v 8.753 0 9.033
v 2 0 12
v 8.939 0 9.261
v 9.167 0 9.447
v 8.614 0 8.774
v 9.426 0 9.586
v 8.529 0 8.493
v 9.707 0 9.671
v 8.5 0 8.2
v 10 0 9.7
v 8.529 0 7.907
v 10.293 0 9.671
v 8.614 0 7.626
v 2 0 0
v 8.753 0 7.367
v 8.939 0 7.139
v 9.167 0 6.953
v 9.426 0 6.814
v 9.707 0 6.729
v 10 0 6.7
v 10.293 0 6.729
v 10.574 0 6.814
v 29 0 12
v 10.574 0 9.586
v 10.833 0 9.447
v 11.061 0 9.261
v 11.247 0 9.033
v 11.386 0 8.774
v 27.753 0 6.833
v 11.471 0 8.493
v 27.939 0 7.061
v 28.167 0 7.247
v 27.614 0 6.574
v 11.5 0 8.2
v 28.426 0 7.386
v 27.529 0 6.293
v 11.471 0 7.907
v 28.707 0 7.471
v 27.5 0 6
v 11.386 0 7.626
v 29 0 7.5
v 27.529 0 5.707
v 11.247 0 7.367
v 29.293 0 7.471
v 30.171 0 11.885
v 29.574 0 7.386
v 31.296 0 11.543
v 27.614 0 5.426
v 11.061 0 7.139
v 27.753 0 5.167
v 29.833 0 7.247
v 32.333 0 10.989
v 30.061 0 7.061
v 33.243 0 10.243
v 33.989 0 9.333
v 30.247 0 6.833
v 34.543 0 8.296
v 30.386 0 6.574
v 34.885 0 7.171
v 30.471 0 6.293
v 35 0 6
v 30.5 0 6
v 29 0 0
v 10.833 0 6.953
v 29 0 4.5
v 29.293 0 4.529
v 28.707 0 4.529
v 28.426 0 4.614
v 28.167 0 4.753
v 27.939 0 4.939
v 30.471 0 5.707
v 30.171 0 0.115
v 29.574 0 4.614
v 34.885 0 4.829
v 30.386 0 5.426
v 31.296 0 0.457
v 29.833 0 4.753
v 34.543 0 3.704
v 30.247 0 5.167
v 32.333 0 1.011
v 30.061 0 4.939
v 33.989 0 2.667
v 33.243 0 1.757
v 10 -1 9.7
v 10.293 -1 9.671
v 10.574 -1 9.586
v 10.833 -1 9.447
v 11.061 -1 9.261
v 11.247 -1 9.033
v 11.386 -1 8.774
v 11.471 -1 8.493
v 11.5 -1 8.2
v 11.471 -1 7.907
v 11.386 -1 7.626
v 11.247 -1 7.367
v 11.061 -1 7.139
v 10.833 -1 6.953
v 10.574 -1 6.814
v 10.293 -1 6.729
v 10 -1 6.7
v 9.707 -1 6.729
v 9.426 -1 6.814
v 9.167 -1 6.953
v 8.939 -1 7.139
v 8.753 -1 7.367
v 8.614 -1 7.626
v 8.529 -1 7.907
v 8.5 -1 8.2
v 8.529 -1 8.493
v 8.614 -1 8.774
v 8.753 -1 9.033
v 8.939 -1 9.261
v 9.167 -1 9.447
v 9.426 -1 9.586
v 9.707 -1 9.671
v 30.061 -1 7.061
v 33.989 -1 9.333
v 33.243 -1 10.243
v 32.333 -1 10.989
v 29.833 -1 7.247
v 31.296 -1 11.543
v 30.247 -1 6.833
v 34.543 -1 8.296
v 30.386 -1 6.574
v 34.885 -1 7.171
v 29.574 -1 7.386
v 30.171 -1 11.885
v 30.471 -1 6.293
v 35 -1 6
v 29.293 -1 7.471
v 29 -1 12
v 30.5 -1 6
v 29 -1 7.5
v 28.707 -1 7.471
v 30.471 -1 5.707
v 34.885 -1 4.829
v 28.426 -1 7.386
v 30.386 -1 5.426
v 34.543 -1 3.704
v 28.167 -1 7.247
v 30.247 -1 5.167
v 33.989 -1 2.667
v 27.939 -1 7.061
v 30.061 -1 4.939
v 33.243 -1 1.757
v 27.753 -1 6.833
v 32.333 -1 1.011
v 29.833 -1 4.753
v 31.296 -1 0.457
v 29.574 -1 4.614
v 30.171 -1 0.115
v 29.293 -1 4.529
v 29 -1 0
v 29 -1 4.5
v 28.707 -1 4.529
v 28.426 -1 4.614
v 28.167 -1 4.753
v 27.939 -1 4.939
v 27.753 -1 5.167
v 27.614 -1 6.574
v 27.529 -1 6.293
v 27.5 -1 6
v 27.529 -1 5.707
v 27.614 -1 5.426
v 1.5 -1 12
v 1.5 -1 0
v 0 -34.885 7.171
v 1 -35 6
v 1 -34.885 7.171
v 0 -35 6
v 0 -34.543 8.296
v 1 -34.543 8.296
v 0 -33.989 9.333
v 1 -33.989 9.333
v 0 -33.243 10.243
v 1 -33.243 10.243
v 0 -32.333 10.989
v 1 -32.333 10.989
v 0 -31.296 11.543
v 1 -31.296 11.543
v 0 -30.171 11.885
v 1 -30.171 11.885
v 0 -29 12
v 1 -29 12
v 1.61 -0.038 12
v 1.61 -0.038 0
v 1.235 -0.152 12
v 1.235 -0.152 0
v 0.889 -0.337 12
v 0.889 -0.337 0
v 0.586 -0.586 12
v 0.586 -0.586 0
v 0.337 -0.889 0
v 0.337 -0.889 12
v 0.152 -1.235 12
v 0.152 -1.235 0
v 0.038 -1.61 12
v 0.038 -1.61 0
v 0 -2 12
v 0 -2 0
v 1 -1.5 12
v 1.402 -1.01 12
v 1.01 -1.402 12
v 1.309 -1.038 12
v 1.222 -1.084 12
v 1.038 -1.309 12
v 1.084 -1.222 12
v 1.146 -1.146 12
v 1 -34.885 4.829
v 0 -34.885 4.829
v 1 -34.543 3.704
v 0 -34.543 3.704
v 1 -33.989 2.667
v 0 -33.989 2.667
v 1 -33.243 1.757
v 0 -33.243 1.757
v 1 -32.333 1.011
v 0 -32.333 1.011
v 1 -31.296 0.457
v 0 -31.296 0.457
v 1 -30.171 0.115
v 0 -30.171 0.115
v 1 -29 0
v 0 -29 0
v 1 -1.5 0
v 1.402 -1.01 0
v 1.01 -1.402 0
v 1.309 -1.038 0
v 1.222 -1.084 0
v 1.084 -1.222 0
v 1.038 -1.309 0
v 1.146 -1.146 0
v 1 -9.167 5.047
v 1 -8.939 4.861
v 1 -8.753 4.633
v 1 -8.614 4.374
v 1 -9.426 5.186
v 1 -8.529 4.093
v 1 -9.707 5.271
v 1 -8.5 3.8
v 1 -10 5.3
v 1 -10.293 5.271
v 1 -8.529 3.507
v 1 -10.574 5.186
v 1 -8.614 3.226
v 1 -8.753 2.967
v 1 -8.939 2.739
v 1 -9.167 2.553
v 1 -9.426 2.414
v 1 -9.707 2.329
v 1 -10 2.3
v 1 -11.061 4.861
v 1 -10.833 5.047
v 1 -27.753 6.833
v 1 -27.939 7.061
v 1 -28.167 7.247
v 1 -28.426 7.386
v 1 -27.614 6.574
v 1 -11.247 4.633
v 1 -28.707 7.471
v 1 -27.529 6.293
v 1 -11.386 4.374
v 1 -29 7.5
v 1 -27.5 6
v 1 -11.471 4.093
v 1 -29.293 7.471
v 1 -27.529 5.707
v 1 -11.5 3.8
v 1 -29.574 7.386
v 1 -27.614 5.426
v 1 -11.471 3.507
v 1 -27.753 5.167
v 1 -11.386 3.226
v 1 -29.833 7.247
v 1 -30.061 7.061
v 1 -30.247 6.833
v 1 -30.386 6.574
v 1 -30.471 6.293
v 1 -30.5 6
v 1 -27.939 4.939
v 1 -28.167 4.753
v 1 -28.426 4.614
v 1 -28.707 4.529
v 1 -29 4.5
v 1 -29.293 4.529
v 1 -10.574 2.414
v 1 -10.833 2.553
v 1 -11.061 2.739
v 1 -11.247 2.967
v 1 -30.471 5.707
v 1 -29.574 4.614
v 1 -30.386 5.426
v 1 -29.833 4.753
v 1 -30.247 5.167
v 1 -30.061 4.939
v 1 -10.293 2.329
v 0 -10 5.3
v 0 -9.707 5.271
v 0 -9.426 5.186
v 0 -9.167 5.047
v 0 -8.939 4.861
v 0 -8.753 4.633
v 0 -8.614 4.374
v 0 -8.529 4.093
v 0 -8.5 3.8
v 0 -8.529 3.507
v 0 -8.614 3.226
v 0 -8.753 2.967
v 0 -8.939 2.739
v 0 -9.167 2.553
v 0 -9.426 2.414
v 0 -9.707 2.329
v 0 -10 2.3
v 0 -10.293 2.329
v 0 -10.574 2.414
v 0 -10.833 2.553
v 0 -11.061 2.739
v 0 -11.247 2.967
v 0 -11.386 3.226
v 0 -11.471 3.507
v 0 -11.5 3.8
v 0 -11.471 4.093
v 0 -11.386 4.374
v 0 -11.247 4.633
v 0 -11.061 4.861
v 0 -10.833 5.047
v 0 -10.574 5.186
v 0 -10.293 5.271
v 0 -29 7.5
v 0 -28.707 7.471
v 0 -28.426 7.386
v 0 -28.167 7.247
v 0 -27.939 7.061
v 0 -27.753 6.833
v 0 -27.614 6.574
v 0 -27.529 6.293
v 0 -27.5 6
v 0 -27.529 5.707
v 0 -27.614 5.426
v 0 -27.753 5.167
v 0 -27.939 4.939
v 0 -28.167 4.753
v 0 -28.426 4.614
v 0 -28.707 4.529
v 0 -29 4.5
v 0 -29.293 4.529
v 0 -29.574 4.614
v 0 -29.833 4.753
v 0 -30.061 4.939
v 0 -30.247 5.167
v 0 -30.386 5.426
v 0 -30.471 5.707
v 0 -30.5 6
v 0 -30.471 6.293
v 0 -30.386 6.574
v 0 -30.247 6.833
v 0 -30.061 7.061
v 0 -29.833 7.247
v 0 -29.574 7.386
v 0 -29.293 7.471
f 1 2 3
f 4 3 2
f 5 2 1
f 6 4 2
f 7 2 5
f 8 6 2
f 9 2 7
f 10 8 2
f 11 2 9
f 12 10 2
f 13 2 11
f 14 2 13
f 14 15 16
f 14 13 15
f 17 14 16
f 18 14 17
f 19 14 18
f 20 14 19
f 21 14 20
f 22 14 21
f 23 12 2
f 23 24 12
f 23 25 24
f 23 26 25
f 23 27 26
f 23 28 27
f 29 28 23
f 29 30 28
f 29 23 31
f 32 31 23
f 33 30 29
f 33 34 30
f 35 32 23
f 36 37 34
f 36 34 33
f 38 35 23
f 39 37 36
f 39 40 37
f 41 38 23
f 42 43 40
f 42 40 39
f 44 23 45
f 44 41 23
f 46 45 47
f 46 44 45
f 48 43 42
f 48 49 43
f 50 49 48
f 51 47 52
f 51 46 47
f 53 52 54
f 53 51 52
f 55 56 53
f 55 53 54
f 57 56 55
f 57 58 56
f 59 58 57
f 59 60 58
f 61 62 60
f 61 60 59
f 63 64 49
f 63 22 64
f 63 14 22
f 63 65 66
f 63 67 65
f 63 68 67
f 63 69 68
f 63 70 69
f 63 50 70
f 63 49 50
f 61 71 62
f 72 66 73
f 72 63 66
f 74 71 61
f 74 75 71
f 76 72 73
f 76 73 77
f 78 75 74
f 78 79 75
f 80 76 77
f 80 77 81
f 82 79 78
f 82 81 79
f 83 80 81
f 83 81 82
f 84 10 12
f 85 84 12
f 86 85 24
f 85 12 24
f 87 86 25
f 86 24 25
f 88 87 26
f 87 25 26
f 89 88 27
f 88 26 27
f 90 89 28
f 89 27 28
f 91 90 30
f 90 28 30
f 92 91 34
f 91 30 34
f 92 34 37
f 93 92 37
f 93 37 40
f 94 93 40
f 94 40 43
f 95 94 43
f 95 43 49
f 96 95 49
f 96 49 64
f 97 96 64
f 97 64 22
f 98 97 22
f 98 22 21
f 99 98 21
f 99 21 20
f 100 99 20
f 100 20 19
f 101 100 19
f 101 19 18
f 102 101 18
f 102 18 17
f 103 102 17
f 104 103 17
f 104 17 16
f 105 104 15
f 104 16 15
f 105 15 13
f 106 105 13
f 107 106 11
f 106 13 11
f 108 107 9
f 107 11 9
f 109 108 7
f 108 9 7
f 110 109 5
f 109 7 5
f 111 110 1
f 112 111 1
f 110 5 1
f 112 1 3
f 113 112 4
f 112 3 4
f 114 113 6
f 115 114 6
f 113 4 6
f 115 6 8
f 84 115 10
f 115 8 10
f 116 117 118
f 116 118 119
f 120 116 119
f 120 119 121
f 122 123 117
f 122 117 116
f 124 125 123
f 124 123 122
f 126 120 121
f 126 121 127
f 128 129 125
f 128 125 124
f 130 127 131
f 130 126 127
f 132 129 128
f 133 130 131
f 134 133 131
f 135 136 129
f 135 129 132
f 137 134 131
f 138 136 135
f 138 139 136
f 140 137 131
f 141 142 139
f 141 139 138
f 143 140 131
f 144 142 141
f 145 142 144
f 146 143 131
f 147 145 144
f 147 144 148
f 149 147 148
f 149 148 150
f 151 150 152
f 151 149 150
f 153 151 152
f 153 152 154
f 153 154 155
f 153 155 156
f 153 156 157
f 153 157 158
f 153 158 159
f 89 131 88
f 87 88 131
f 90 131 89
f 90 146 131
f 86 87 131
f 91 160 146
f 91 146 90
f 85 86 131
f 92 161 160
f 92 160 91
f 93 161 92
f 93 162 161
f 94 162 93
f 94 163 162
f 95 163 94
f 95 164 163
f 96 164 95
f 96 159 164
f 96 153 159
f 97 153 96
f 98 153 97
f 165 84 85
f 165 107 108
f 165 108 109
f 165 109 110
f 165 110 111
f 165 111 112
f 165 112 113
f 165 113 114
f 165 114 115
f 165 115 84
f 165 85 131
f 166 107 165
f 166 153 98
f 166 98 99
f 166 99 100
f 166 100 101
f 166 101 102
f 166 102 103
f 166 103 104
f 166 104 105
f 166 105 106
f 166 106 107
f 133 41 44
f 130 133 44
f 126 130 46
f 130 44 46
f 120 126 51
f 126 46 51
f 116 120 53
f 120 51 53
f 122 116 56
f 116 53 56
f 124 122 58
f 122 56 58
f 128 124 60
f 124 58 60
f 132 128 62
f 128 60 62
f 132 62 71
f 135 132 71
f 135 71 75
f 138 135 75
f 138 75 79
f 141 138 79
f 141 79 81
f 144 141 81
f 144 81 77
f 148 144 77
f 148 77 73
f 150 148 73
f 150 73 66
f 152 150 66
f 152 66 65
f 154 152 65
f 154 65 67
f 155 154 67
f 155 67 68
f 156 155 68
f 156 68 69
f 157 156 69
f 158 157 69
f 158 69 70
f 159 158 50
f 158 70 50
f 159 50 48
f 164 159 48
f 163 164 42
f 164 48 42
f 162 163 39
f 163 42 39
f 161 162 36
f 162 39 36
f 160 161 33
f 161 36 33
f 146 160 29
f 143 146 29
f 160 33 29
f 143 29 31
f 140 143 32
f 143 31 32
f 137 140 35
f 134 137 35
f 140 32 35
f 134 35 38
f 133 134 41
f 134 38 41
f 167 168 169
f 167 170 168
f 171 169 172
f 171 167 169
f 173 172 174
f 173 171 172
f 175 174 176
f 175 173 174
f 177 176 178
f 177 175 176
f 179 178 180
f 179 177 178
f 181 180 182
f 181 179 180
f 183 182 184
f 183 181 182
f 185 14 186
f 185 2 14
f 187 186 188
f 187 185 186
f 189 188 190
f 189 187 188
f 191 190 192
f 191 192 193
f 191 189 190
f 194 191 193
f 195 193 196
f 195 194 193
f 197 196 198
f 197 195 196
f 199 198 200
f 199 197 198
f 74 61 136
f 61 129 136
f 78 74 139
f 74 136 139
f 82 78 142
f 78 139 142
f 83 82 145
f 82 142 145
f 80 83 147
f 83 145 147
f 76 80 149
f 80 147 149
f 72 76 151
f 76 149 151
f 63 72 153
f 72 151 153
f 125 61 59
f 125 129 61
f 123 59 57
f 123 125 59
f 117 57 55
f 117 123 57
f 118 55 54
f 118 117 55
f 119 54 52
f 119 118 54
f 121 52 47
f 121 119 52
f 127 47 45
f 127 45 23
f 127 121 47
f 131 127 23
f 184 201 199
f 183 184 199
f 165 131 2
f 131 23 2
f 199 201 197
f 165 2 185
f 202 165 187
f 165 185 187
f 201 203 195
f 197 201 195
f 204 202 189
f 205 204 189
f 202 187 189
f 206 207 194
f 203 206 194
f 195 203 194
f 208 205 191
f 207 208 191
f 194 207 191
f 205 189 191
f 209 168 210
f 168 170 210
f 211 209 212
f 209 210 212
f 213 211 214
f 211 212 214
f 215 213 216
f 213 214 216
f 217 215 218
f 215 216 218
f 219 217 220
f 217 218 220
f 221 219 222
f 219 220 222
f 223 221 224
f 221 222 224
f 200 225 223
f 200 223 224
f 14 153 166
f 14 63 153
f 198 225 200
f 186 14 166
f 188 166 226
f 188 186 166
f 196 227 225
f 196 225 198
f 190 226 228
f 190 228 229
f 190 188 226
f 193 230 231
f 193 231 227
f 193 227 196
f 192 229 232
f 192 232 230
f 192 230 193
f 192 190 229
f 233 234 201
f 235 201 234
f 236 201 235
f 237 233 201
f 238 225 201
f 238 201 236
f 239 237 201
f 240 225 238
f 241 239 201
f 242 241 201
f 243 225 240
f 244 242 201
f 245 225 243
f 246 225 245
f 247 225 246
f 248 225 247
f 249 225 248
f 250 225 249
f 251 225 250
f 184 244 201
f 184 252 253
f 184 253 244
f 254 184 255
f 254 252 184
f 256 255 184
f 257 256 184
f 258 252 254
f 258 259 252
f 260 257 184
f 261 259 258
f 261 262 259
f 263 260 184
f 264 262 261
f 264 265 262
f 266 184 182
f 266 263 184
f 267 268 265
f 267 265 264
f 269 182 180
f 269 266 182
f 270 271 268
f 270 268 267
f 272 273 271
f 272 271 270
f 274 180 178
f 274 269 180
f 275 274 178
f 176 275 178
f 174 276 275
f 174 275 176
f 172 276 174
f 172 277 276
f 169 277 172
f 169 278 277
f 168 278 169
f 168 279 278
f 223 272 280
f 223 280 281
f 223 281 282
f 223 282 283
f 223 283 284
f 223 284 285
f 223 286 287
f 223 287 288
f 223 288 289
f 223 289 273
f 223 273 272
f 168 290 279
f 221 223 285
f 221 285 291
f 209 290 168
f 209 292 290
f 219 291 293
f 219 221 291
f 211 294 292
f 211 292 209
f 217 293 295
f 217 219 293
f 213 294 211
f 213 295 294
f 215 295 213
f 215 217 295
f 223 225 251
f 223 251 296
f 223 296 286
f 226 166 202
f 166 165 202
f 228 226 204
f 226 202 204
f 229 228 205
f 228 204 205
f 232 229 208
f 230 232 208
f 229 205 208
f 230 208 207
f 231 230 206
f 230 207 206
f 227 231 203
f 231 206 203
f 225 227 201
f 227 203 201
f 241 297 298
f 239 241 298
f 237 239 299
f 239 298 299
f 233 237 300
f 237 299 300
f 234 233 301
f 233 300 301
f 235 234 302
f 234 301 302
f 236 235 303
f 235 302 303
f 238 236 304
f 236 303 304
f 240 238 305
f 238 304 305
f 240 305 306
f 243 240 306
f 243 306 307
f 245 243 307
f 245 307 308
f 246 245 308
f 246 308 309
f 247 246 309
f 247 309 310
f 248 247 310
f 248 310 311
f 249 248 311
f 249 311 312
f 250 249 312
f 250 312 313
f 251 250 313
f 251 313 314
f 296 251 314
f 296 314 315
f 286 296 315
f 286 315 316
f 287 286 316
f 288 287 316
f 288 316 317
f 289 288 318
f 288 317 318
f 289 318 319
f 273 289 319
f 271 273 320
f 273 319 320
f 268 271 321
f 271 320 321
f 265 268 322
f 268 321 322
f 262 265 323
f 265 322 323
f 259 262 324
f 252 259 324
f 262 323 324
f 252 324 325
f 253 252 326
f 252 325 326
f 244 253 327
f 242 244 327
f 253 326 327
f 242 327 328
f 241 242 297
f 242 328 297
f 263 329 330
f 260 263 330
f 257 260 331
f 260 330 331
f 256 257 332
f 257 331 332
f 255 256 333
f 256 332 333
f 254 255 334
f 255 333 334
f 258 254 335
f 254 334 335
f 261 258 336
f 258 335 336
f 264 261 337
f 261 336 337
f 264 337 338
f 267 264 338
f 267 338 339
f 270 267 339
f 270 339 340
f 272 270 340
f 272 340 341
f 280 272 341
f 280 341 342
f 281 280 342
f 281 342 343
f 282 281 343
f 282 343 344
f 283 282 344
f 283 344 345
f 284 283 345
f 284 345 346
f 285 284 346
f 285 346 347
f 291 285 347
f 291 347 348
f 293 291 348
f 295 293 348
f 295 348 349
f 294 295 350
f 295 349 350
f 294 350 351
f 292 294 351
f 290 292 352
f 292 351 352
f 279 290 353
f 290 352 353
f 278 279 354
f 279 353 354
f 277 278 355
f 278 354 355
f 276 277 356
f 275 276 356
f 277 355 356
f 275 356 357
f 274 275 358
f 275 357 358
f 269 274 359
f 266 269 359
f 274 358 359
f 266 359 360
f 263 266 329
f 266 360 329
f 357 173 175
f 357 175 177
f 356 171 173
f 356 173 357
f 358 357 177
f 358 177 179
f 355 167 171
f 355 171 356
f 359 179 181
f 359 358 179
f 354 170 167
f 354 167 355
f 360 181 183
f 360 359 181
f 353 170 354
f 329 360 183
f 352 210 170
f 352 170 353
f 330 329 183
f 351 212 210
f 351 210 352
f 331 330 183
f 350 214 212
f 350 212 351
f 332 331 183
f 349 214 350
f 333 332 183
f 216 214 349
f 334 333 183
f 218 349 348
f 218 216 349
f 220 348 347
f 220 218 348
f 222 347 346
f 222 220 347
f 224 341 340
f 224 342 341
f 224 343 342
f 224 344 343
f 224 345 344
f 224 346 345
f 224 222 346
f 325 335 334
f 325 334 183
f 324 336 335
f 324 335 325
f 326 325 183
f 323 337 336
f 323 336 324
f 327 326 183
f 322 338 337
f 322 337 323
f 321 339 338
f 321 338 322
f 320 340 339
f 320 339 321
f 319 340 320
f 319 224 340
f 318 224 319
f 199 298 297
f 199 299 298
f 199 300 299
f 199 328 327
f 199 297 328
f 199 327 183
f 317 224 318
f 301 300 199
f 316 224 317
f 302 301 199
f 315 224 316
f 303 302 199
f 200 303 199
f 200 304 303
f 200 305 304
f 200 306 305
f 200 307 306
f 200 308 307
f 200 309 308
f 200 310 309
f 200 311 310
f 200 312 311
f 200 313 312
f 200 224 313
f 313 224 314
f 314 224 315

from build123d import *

# Parameters (mm, degrees)
EXTRUDE_1_DEPTH     = 12
FILLET_1_R          = 6
FILLET_2_R          = 2
FILLET_3_R          = 0.5
SKETCH_2_R          = 1.5
CUT_EXTRUDE_1_DEPTH = 51.931326313
SKETCH_3_R          = 1.5
CUT_EXTRUDE_2_DEPTH = 51.931326313


with BuildPart() as part:
    # 草图1 → 凸台-拉伸1 (new body)
    with BuildSketch(Plane.XY):
        Polygon((0, 0), (35, 0), (35, -1), (1, -1), (1, -35), (0, -35), align=None)
    extrude(amount=EXTRUDE_1_DEPTH)

    # 圆角1
    fillet_1_edges = [part.edges().sort_by_distance(p)[0] for p in [
        (0.5, -35, 12),
        (0.5, -35, 0),
        (35, -0.5, 0),
        (35, -0.5, 12),
    ]]
    fillet(fillet_1_edges, radius=FILLET_1_R - 0.0001)  # a hair under: the kernel refuses the full size

    # 圆角2
    fillet_2_edges = [part.edges().sort_by_distance(p)[0] for p in [
        (0, 0, 6),
    ]]
    fillet(fillet_2_edges, radius=FILLET_2_R)

    # 圆角3
    fillet_3_edges = [part.edges().sort_by_distance(p)[0] for p in [
        (1, -1, 6),
    ]]
    fillet(fillet_3_edges, radius=FILLET_3_R)

    # 草图2 → 切除-拉伸1 (cut, through all)
    with BuildSketch(Plane.ZY):
        with Locations((6, -29)):
            Circle(SKETCH_2_R)
        with Locations((3.8, -10)):
            Circle(SKETCH_2_R)
    extrude(amount=-CUT_EXTRUDE_1_DEPTH, mode=Mode.SUBTRACT)

    # 草图3 → 切除-拉伸2 (cut, through all)
    with BuildSketch(Plane(origin=(0, 0, 0), x_dir=(1, 0, 0), z_dir=(0, 1, 0))):
        with Locations(Location((29, -6, 0), (0, 0, 270))):
            Circle(SKETCH_3_R)
        with Locations(Location((10, -8.2, 0), (0, 0, 270))):
            Circle(SKETCH_3_R)
    extrude(amount=-CUT_EXTRUDE_2_DEPTH, mode=Mode.SUBTRACT)


solid = part.part
